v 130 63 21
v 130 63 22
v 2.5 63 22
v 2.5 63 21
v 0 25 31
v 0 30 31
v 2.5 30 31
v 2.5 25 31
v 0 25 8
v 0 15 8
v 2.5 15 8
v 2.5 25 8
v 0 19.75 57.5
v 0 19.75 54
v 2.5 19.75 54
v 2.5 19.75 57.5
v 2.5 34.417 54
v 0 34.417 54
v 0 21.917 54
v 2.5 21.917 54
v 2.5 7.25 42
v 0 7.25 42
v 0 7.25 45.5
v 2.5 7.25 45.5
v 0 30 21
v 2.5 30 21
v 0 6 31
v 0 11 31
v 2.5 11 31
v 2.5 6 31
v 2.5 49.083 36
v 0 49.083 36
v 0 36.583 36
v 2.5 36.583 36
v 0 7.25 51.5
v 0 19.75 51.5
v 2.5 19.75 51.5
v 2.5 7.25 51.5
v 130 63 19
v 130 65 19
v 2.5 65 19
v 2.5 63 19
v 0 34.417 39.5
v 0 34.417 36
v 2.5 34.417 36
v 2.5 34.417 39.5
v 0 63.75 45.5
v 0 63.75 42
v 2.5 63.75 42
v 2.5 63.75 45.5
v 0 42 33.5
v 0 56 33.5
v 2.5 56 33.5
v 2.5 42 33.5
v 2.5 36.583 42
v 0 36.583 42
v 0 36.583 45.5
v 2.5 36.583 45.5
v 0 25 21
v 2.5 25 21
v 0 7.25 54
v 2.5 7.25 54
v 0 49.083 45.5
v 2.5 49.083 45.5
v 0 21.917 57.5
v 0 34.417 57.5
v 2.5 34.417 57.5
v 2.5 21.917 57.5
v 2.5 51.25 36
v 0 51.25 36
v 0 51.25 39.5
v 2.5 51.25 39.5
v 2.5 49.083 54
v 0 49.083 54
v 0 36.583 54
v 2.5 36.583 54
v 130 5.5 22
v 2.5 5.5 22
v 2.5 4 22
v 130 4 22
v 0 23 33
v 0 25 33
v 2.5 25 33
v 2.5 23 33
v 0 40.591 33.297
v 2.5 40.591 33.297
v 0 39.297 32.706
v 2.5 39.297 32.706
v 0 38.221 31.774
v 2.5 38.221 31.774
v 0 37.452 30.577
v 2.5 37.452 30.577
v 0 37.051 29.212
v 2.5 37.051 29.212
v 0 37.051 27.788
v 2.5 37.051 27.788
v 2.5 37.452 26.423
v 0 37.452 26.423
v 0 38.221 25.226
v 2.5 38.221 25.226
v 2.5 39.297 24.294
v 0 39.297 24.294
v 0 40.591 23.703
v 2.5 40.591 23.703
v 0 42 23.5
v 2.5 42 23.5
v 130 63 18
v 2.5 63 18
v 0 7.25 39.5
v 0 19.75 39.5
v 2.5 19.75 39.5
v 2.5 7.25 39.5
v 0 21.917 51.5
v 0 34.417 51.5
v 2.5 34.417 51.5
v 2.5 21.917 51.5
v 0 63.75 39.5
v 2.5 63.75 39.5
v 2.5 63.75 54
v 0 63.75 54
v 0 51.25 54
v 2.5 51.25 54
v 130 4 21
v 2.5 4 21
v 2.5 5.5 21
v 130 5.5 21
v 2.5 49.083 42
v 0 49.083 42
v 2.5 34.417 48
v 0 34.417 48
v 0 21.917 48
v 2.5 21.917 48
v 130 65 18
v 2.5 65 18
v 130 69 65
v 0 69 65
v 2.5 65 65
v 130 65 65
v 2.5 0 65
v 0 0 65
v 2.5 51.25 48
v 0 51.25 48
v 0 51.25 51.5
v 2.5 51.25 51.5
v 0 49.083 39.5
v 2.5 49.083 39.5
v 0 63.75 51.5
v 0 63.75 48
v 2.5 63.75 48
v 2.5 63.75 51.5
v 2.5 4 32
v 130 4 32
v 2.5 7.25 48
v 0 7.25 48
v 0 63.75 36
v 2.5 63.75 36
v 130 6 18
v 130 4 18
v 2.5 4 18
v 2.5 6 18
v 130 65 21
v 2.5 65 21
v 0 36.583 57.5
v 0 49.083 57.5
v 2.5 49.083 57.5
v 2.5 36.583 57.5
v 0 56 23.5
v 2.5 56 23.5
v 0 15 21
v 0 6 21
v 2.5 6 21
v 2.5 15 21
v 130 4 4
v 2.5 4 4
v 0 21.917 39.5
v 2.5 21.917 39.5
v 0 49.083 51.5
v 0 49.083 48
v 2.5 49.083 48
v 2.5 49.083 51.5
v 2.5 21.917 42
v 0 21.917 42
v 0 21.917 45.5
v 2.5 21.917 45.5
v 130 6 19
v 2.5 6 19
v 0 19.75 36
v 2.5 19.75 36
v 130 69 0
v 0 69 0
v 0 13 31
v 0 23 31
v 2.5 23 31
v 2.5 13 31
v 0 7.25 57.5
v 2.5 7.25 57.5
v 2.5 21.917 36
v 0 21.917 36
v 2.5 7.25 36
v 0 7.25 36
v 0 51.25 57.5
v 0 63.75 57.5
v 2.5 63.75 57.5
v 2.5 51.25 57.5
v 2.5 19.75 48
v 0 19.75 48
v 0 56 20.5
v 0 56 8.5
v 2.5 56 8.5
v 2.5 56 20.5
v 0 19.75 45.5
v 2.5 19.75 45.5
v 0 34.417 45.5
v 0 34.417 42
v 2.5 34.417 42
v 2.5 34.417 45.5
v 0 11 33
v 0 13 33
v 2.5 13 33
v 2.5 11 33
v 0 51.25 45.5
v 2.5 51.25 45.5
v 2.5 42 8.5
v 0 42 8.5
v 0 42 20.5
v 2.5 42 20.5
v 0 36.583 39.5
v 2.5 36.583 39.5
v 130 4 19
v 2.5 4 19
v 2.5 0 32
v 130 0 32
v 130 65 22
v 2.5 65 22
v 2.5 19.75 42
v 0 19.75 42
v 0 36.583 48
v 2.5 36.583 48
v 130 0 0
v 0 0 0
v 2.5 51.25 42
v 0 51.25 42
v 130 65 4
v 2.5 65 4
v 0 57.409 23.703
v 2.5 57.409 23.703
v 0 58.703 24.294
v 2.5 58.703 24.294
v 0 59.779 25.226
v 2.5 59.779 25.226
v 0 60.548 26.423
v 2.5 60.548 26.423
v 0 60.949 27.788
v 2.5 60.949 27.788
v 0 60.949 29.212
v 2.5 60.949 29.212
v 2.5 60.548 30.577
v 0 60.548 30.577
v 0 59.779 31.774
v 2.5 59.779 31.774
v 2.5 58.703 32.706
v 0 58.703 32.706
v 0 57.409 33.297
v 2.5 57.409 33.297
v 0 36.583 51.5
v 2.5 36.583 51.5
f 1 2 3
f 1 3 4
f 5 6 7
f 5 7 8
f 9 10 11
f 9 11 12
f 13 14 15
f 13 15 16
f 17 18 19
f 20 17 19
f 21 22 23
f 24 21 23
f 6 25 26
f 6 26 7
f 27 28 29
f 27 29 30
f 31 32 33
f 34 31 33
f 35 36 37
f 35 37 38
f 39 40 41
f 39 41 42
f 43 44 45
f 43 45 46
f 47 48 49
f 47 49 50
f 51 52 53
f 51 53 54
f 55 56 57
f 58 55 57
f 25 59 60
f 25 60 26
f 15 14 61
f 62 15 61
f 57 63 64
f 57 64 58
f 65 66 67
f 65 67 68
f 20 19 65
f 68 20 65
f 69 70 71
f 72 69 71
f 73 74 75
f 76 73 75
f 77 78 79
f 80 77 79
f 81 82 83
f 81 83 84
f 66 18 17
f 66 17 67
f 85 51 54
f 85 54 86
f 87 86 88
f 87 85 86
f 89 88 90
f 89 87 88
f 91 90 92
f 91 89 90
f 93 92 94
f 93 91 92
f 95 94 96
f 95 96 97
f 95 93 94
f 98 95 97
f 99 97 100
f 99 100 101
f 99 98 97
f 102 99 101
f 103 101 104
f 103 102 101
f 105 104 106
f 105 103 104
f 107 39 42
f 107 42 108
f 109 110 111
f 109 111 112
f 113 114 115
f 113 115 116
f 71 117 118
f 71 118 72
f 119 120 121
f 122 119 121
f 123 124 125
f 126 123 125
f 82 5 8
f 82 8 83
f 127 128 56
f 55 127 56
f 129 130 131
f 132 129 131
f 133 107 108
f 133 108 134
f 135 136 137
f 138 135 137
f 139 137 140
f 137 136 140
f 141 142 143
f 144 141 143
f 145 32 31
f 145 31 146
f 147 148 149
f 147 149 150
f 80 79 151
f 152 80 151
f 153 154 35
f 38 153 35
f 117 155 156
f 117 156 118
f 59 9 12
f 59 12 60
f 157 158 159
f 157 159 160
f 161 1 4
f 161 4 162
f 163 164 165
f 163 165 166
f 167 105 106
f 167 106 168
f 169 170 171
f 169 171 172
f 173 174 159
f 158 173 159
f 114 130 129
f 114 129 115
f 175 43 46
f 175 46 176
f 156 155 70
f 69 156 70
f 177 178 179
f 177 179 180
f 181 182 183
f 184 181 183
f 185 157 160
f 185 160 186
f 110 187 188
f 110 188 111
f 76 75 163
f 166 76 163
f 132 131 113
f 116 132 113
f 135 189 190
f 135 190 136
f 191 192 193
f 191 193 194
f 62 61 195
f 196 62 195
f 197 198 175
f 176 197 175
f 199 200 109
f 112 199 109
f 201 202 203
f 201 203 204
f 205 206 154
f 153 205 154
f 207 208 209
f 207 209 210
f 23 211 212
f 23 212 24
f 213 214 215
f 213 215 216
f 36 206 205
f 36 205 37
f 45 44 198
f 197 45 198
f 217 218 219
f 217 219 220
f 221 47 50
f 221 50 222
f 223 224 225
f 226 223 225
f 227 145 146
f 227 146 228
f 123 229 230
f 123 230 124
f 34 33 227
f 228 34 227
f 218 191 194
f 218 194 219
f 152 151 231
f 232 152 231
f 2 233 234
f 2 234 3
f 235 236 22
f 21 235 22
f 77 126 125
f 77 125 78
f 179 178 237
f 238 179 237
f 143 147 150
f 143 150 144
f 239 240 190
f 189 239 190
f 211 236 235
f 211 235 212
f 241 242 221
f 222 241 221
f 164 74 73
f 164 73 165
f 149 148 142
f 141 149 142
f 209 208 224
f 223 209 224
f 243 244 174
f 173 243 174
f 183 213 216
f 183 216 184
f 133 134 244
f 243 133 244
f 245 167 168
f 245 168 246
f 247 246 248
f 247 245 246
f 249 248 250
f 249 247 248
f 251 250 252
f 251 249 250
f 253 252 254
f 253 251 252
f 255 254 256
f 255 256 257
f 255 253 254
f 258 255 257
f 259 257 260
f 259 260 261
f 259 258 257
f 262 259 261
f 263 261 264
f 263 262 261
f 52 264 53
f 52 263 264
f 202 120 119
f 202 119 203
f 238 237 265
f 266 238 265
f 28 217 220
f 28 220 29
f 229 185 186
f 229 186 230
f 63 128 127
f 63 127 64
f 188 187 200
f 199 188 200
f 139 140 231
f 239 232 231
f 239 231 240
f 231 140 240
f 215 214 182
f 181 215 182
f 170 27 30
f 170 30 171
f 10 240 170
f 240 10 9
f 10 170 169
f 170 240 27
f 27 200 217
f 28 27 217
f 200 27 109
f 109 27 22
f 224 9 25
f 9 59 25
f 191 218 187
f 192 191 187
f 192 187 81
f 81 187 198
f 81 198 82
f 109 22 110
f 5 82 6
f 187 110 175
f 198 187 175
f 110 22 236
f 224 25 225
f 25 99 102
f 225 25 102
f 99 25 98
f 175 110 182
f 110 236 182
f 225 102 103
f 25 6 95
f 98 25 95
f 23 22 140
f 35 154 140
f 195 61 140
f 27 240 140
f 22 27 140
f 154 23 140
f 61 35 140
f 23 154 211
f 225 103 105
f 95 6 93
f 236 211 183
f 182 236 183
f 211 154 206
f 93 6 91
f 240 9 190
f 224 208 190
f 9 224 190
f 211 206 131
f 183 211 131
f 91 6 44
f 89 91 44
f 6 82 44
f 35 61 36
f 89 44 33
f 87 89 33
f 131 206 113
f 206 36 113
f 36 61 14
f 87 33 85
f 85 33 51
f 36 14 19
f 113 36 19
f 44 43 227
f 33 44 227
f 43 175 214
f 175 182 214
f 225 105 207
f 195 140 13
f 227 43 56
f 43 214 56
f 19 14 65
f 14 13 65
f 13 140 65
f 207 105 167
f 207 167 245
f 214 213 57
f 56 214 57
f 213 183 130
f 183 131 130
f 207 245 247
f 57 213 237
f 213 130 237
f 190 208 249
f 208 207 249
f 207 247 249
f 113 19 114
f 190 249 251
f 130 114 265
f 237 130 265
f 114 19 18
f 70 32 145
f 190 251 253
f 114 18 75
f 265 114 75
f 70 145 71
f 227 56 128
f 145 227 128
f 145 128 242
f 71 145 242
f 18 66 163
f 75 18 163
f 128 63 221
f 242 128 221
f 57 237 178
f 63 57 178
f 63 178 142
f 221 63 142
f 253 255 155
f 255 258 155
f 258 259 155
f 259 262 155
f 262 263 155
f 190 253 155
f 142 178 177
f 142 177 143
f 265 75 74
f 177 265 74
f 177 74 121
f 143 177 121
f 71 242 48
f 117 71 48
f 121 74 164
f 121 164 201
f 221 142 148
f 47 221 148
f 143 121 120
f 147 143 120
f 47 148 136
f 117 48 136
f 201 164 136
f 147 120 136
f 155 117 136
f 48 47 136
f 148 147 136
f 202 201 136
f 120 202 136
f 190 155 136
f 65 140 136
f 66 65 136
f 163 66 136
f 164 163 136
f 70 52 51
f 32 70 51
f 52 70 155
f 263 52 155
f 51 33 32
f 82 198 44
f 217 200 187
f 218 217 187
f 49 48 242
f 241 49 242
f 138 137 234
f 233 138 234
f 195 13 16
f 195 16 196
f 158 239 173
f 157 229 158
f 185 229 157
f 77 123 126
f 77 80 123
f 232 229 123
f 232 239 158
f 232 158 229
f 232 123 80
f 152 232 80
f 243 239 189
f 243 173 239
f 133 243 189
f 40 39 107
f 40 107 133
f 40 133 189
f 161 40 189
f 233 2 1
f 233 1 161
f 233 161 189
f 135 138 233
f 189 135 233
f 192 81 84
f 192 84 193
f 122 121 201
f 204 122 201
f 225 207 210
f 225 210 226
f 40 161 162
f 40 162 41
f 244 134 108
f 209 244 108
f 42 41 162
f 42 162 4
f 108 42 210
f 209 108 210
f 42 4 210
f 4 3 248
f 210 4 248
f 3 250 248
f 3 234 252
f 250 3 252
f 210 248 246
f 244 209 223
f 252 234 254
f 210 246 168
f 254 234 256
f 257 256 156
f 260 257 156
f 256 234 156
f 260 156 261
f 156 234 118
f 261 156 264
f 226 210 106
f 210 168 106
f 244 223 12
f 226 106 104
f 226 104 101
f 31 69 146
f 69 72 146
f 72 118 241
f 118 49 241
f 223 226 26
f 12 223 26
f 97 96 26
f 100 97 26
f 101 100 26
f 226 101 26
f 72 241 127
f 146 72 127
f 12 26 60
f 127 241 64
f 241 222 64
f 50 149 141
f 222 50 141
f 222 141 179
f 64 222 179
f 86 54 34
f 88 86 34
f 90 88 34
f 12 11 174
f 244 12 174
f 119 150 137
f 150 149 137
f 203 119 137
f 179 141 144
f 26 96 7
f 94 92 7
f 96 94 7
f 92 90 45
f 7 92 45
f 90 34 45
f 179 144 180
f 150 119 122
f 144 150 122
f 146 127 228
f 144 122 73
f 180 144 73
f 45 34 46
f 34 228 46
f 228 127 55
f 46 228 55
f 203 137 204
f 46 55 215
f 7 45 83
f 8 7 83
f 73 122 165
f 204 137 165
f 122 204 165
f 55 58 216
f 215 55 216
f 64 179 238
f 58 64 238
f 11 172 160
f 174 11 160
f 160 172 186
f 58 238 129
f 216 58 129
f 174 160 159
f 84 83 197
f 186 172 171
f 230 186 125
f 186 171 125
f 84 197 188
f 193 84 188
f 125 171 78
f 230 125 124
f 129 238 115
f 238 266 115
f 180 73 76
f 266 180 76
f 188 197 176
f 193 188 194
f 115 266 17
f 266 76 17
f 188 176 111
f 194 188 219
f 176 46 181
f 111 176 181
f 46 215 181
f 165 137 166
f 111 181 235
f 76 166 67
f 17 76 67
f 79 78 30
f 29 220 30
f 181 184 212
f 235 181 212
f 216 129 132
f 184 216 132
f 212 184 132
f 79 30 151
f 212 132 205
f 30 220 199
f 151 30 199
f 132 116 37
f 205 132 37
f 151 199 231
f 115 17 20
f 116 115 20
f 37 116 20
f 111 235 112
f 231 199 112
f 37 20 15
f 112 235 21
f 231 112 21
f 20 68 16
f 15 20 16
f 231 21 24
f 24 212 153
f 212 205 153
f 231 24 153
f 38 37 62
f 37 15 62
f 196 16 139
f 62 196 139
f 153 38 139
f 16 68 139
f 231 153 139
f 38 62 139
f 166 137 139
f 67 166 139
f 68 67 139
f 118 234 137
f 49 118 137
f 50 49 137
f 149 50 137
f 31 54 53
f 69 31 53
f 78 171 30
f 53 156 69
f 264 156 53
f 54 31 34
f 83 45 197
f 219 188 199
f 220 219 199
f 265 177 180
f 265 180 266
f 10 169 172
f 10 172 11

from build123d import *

# Parameters (mm, degrees)
F1_DEPTH = 130
F2_W     = 69
F2_H     = 65
F2_W_2   = 14
F2_H_2   = 12
F2_W_3   = 12.5
F2_H_3   = 3.5
F3_DEPTH = 2.5


with BuildPart() as f1:
    # F0 (on Right) → F1 (new body)
    with BuildSketch(Plane.YZ):
        Polygon((0, 32), (0, 0), (69, 0), (69, 65), (65, 65), (65, 22), (63, 22), (63, 21), (65, 21), (65, 19), (63, 19), (63, 18), (65, 18), (65, 4), (4, 4), (4, 18), (6, 18), (6, 19), (4, 19), (4, 21), (5.5, 21), (5.5, 22), (4, 22), (4, 32), align=None)
    extrude(amount=F1_DEPTH)

    # F2 (on face) → F3 (join)
    with BuildSketch(Plane(origin=(0, 0, 0), x_dir=(0, -1, 0), z_dir=(-1, 0, 0))):
        with Locations((-34.5, 32.5)):
            Rectangle(F2_W, F2_H)
        with Locations((-49, 14.5)):
            Rectangle(F2_W_2, F2_H_2, mode=Mode.SUBTRACT)
        with BuildLine():
            Line((-42, 23.5), (-56, 23.5))
            ThreePointArc((-56, 23.5), (-61, 28.5), (-56, 33.5))
            Line((-56, 33.5), (-42, 33.5))
            ThreePointArc((-42, 33.5), (-37, 28.5), (-42, 23.5))
        make_face(mode=Mode.SUBTRACT)
        Polygon((-11, 31), (-6, 31), (-6, 21), (-15, 21), (-15, 8), (-25, 8), (-25, 21), (-30, 21), (-30, 31), (-25, 31), (-25, 33), (-23, 33), (-23, 31), (-13, 31), (-13, 33), (-11, 33), align=None, mode=Mode.SUBTRACT)
        with Locations((-57.5, 37.75)):
            Rectangle(F2_W_3, F2_H_3, mode=Mode.SUBTRACT)
        with Locations((-57.5, 43.75)):
            Rectangle(F2_W_3, F2_H_3, mode=Mode.SUBTRACT)
        with Locations((-42.833333, 37.75)):
            Rectangle(F2_W_3, F2_H_3, mode=Mode.SUBTRACT)
        with Locations((-42.833333, 43.75)):
            Rectangle(F2_W_3, F2_H_3, mode=Mode.SUBTRACT)
        with Locations((-57.5, 49.75)):
            Rectangle(F2_W_3, F2_H_3, mode=Mode.SUBTRACT)
        with Locations((-57.5, 55.75)):
            Rectangle(F2_W_3, F2_H_3, mode=Mode.SUBTRACT)
        with Locations((-42.833333, 49.75)):
            Rectangle(F2_W_3, F2_H_3, mode=Mode.SUBTRACT)
        with Locations((-42.833333, 55.75)):
            Rectangle(F2_W_3, F2_H_3, mode=Mode.SUBTRACT)
        with Locations((-28.166667, 37.75)):
            Rectangle(F2_W_3, F2_H_3, mode=Mode.SUBTRACT)
        with Locations((-28.166667, 43.75)):
            Rectangle(F2_W_3, F2_H_3, mode=Mode.SUBTRACT)
        with Locations((-13.5, 37.75)):
            Rectangle(F2_W_3, F2_H_3, mode=Mode.SUBTRACT)
        with Locations((-13.5, 43.75)):
            Rectangle(F2_W_3, F2_H_3, mode=Mode.SUBTRACT)
        with Locations((-28.166667, 49.75)):
            Rectangle(F2_W_3, F2_H_3, mode=Mode.SUBTRACT)
        with Locations((-28.166667, 55.75)):
            Rectangle(F2_W_3, F2_H_3, mode=Mode.SUBTRACT)
        with Locations((-13.5, 49.75)):
            Rectangle(F2_W_3, F2_H_3, mode=Mode.SUBTRACT)
        with Locations((-13.5, 55.75)):
            Rectangle(F2_W_3, F2_H_3, mode=Mode.SUBTRACT)
    extrude(amount=-F3_DEPTH)


solid = f1.part
